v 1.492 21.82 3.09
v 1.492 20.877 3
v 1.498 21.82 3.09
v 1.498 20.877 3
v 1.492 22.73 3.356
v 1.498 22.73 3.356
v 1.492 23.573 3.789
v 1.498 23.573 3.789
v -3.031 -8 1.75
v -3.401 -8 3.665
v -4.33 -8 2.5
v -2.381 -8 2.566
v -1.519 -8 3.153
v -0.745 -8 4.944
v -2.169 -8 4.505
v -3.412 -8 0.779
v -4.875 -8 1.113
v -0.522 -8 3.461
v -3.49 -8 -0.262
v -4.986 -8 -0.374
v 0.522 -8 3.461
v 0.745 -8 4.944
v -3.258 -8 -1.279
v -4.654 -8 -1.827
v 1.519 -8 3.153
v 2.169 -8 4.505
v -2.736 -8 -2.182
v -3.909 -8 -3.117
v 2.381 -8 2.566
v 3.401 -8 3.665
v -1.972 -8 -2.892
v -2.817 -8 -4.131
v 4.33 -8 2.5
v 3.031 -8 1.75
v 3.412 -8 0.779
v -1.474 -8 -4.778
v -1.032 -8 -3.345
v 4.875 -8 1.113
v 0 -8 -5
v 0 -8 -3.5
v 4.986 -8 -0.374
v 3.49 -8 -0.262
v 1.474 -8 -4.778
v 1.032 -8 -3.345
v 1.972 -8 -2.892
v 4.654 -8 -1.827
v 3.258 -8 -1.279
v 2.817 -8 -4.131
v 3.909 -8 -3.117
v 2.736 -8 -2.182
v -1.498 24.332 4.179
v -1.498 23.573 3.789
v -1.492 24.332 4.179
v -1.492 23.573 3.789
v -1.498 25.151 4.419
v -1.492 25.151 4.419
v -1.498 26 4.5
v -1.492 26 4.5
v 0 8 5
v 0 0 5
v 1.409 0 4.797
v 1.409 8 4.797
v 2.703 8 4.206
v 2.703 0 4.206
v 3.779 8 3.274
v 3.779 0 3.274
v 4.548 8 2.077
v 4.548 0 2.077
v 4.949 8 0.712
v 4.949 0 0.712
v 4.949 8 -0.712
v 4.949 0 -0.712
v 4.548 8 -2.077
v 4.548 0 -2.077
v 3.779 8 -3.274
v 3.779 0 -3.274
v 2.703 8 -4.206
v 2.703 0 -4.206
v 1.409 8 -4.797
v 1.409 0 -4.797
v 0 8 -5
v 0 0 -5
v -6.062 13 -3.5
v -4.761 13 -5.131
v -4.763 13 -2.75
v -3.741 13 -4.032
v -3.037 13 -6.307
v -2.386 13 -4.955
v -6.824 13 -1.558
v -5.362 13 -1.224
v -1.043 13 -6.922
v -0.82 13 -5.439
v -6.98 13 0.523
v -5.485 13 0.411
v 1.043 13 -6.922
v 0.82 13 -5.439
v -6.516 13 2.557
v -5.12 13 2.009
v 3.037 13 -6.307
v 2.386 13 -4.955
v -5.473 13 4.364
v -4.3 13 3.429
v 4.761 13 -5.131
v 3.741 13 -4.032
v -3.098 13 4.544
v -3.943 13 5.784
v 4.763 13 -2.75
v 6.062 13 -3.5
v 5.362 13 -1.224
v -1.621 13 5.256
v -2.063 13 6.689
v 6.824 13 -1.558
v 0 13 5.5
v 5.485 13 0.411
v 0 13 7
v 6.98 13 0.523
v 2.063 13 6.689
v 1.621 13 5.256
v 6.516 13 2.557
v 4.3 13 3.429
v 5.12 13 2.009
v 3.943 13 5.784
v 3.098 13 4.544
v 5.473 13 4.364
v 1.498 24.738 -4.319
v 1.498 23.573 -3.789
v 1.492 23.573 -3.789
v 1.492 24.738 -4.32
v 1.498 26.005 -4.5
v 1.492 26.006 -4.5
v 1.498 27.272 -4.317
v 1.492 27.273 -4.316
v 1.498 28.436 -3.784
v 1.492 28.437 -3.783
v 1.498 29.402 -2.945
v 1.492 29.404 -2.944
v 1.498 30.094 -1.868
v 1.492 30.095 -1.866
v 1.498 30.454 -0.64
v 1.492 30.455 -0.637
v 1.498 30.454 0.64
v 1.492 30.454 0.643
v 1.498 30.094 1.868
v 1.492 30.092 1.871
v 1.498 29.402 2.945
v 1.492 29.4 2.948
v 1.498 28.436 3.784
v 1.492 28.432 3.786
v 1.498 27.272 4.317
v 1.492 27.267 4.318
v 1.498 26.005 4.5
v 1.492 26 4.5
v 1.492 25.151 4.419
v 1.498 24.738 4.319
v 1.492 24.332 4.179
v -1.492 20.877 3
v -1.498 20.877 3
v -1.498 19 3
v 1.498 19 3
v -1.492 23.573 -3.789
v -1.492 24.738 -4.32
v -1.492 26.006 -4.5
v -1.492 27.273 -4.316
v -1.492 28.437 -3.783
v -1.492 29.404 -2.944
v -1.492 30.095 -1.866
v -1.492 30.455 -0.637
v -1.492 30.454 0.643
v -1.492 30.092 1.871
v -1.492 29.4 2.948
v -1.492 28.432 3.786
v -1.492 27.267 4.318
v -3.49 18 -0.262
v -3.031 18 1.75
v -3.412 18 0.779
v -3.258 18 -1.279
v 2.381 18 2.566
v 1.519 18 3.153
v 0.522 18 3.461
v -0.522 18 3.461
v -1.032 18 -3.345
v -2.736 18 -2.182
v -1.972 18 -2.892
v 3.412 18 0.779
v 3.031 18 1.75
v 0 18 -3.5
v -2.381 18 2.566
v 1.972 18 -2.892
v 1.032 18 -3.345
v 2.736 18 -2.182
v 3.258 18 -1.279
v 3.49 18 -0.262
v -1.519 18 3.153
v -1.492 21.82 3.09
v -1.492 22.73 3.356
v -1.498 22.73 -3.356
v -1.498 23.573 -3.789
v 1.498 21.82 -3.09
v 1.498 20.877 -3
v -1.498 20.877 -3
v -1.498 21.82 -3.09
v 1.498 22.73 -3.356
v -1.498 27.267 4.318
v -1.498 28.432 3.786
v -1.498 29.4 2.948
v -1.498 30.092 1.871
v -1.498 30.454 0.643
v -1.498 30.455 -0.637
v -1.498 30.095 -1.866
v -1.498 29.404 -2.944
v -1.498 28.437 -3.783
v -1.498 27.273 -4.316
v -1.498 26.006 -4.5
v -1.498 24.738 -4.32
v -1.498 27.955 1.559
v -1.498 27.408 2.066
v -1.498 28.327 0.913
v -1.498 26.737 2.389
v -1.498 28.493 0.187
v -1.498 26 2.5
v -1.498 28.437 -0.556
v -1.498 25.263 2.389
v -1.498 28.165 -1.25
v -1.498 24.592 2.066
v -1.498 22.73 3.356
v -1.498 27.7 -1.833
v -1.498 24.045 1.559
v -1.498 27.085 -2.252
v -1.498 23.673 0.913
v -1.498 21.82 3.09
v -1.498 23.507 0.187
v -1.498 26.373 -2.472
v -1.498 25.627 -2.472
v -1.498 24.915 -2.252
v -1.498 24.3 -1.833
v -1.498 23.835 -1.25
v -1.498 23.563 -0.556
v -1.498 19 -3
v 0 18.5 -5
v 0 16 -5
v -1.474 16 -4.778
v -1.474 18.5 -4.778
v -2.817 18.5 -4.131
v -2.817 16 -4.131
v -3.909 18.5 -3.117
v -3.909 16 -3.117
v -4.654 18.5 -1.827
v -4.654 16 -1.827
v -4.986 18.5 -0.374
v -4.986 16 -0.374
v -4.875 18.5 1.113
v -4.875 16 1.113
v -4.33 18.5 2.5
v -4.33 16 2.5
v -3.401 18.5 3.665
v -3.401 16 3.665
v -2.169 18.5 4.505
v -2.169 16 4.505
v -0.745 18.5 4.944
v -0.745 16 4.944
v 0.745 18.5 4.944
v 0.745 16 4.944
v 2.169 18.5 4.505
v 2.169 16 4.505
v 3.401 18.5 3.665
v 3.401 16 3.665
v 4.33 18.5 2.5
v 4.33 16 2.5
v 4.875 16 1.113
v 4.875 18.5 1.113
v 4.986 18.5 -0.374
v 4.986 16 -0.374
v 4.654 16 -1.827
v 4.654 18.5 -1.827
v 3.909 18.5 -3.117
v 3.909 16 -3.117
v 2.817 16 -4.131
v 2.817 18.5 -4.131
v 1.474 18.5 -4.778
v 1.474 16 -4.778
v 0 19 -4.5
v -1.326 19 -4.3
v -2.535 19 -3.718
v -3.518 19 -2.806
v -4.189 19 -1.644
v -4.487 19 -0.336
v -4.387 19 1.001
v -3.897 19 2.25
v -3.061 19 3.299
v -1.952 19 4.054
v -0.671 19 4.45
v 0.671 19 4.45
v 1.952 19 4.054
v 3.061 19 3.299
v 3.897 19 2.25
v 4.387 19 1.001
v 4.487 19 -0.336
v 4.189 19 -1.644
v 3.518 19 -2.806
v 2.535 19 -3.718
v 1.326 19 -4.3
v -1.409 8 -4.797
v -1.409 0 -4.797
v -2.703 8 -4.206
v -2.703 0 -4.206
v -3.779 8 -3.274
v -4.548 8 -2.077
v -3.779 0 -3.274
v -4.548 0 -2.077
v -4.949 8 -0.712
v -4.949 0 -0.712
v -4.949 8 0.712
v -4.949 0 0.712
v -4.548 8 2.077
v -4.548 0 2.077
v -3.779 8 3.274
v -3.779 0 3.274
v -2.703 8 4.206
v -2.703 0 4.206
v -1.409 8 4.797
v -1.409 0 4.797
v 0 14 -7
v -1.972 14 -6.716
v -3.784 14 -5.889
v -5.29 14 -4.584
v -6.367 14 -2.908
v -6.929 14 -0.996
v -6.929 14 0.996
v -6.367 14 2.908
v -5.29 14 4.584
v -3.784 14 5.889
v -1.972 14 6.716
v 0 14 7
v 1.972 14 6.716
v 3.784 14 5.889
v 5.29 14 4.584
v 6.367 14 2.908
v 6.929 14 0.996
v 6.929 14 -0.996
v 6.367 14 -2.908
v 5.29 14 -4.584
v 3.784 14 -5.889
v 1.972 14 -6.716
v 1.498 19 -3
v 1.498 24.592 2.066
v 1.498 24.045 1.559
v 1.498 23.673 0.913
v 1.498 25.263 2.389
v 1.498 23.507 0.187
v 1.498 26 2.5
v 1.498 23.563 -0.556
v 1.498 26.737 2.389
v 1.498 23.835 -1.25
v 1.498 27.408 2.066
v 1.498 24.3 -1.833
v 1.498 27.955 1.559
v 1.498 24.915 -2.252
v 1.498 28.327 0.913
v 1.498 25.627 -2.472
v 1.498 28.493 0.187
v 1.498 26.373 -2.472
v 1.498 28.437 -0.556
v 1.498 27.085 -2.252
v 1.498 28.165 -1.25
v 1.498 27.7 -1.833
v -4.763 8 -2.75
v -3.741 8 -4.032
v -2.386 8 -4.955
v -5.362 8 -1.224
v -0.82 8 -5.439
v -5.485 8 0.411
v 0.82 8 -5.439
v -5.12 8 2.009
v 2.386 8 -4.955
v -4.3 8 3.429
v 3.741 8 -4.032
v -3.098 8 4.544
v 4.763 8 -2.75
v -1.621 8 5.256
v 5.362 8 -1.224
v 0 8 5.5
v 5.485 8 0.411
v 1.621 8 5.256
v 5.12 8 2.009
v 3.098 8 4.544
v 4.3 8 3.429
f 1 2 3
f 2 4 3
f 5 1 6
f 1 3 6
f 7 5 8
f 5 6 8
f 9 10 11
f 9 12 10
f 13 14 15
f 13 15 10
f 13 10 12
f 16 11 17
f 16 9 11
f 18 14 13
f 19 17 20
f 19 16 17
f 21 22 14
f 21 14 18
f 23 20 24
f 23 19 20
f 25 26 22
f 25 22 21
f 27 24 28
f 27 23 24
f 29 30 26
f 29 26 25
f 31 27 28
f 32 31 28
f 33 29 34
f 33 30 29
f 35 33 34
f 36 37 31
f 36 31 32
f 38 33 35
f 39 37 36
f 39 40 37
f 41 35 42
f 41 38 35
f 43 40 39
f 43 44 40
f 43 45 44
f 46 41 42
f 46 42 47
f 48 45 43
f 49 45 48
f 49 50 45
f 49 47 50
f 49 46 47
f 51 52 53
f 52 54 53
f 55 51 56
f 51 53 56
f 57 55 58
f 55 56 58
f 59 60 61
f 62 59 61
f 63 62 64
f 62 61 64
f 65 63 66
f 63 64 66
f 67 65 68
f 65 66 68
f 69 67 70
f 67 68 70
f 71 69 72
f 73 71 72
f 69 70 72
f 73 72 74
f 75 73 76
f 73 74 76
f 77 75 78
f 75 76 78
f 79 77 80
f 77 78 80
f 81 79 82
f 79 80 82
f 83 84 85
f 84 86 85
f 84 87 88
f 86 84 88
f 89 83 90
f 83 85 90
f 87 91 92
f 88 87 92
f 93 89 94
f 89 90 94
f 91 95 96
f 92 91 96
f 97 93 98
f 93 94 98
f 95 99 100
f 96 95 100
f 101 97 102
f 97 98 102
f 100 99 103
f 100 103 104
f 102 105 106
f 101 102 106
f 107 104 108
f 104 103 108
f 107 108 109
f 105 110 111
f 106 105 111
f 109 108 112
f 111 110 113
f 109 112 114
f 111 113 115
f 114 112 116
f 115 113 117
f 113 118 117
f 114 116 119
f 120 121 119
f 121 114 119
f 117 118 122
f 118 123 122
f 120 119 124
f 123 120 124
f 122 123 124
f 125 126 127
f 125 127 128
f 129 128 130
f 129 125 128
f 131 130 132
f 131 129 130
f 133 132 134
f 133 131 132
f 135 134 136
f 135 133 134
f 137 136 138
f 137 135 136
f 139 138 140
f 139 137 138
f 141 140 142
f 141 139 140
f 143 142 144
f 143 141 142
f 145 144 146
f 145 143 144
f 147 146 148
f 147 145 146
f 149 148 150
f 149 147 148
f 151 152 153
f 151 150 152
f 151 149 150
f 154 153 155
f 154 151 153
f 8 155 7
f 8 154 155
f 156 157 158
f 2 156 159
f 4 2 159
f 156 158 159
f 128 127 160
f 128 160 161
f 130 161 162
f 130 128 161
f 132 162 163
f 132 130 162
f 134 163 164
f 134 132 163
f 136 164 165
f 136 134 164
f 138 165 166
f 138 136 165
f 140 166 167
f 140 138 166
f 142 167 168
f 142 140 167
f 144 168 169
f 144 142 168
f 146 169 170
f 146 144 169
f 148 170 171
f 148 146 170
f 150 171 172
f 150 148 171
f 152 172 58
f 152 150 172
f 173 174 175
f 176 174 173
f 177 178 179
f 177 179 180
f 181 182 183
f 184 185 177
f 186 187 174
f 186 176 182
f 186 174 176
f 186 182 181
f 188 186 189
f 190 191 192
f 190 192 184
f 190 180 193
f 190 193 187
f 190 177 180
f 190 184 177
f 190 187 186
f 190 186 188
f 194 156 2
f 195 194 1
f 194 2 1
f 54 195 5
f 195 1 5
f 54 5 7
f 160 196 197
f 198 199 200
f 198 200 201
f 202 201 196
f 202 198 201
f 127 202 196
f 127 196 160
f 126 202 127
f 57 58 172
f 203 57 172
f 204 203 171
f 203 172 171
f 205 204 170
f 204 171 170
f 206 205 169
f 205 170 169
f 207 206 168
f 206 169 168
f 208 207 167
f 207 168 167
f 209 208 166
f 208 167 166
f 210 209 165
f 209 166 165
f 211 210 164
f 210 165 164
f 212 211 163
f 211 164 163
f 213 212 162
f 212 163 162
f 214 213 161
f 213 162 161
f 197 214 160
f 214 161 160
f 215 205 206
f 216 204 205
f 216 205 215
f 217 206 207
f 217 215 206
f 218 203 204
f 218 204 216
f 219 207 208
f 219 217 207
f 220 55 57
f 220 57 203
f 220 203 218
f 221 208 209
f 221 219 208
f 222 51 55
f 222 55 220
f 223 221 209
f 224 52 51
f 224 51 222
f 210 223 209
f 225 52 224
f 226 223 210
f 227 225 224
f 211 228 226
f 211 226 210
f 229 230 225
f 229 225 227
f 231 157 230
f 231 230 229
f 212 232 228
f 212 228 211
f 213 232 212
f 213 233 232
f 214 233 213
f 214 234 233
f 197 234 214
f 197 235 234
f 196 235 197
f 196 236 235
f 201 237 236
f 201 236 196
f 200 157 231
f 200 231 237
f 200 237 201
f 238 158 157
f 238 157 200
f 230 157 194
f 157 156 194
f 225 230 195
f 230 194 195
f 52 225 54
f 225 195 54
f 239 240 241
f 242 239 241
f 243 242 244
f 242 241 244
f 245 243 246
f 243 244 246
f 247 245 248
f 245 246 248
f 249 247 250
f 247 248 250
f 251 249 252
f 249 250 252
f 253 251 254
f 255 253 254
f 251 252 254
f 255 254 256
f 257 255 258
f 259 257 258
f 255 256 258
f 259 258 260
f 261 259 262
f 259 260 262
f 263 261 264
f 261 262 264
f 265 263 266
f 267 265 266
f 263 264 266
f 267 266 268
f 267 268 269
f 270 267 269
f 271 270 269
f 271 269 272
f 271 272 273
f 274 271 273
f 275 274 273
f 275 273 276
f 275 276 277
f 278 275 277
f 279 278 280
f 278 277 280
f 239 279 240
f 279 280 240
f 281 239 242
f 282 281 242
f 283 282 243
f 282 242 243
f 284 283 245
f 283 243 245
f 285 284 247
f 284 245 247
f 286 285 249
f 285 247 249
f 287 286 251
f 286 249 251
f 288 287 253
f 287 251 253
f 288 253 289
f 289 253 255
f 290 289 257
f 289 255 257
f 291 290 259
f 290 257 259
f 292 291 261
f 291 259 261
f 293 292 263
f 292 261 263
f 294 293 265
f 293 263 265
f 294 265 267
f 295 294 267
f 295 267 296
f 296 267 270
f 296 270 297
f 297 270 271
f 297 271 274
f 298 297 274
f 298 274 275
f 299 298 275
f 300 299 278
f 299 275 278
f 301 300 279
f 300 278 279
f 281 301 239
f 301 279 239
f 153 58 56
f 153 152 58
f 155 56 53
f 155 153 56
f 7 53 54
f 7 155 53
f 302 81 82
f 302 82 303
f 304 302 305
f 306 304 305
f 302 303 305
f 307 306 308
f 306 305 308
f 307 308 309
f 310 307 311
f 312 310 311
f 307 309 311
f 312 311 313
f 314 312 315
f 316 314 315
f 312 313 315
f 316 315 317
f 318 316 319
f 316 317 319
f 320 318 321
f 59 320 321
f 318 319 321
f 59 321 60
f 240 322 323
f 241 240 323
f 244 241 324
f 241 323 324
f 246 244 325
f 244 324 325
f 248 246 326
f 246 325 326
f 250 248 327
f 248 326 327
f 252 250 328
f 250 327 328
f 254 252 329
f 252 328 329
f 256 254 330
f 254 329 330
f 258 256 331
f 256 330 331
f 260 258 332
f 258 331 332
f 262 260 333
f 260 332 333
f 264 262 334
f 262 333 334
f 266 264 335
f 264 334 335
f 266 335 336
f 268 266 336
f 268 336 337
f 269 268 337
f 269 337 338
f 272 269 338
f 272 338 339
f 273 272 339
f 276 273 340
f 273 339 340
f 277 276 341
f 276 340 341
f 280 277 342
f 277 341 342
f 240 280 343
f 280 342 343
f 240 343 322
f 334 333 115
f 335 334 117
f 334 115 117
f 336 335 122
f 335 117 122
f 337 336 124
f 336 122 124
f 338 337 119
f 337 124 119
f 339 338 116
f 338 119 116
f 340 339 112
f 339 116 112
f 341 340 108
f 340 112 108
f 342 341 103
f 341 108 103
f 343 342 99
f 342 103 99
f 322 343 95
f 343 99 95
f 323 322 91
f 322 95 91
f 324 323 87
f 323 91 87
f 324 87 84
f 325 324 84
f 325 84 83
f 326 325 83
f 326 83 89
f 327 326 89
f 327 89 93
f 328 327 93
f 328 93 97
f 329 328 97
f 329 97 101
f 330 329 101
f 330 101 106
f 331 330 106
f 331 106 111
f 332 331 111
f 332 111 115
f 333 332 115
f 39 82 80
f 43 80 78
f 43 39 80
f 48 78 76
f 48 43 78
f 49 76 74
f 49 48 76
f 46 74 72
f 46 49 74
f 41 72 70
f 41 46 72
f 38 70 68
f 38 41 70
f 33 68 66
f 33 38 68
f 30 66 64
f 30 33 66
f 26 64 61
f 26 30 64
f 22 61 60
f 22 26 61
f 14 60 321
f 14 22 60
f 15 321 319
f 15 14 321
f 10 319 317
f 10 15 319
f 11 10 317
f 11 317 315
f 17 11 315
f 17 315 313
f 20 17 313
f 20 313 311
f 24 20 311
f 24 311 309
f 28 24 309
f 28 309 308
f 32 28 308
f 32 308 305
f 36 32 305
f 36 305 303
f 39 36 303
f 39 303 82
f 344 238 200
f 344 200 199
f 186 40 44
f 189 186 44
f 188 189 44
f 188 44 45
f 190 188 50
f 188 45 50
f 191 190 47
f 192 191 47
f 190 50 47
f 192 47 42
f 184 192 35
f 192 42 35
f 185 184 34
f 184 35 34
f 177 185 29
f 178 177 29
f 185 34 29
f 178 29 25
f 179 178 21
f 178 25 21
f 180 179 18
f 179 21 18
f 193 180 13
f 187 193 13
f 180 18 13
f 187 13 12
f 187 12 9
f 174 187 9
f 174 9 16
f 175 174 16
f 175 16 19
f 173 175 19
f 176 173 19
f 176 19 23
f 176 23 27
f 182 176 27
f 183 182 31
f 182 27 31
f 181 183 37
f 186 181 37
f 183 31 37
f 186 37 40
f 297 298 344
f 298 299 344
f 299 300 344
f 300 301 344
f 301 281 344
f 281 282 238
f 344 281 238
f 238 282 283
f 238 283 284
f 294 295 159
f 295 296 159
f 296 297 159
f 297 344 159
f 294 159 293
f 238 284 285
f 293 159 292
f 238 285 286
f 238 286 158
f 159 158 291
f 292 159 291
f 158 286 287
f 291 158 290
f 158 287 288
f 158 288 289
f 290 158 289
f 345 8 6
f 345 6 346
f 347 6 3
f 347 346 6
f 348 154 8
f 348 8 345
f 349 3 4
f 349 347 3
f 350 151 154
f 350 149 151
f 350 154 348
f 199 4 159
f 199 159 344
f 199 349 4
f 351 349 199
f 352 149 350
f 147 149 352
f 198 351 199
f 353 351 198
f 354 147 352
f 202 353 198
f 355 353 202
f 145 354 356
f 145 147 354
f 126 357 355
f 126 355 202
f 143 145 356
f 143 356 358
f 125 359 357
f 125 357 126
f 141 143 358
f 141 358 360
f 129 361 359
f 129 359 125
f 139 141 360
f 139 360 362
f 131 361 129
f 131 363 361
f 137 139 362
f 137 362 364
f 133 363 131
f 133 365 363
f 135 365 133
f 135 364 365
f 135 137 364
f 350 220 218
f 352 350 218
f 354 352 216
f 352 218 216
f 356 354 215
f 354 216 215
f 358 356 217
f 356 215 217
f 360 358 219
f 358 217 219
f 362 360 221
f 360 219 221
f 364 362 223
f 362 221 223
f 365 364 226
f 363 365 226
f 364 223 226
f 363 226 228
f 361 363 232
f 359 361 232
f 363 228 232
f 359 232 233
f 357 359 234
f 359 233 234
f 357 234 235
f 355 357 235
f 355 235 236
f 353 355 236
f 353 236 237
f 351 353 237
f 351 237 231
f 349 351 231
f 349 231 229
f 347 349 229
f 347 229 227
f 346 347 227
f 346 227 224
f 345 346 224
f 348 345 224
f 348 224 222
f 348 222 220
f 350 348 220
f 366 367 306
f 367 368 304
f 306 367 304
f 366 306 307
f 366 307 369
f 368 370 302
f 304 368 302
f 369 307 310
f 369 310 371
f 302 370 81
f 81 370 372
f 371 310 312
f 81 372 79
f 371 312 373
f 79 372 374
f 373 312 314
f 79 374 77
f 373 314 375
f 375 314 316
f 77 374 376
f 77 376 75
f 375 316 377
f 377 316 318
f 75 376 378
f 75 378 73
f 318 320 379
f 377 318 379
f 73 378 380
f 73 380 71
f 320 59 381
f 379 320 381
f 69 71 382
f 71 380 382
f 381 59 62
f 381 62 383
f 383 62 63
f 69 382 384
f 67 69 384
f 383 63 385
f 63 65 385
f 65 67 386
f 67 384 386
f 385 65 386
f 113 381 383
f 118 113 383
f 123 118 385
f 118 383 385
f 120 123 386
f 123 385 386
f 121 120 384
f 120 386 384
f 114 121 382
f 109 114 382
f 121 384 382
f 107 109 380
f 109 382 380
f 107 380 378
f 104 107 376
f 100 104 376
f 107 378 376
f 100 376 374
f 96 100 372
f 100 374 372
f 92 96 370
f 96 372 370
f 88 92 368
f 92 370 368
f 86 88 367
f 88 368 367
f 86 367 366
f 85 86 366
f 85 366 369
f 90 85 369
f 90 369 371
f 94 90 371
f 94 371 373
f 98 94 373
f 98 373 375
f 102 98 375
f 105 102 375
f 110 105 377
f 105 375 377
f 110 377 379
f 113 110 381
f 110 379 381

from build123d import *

# Parameters (mm, degrees)
SKETCH1_R            = 5
BOSS_EXTRUDE1_DEPTH  = 8
SKETCH2_R            = 5.5
BOSS_EXTRUDE2_DEPTH  = 5
SKETCH3_R            = 7
BOSS_EXTRUDE3_DEPTH  = 1
CHAMFER2_SIZE        = 0.5
SKETCH48_W           = 2.996334688
SKETCH48_H           = 6
BOSS_EXTRUDE7_DEPTH  = 7
SKETCH50_R           = 4.5
BOSS_EXTRUDE9_DEPTH  = 2.99
BOSS_EXTRUDE10_START = -2.99
SKETCH51_R           = 4.5
BOSS_EXTRUDE10_DEPTH = 2.99
SKETCH52_R           = 2.5
CUT_EXTRUDE1_DEPTH   = 4
BOSS_EXTRUDE11_START = 16
SKETCH56_R           = 5
BOSS_EXTRUDE11_DEPTH = 16
SKETCH57_R           = 3.25
CUT_EXTRUDE7_DEPTH   = 21
SKETCH59_R           = 3.5
CUT_EXTRUDE10_DEPTH  = 26
FILLET1_R            = 5


with BuildPart() as part:
    # Sketch1 → Boss-Extrude1 (new body)
    with BuildSketch(Plane(origin=(0, 0, 0), x_dir=(1, 0, 0), z_dir=(0, 1, 0))):
        with Locations(Location((0, 0, 0), (0, 0, 270))):
            Circle(SKETCH1_R)
    extrude(amount=BOSS_EXTRUDE1_DEPTH)

    # Sketch2 → Boss-Extrude2 (add)
    with BuildSketch(Plane(origin=(0, 8, 0), x_dir=(1, 0, 0), z_dir=(0, 1, 0))):
        with Locations(Location((0, 0, 0), (0, 0, 270))):
            Circle(SKETCH2_R)
    extrude(amount=BOSS_EXTRUDE2_DEPTH)

    # Sketch3 → Boss-Extrude3 (add)
    with BuildSketch(Plane(origin=(0, 13, 0), x_dir=(1, 0, 0), z_dir=(0, 1, 0))):
        with Locations(Location((0, 0, 0), (0, 0, 270))):
            Circle(SKETCH3_R)
    extrude(amount=BOSS_EXTRUDE3_DEPTH)

    # Sketch47 → Revolve1 (revolve)
    with BuildSketch(Plane(origin=(0, 0, 0), x_dir=(0, 0, -1), z_dir=(1, 0, 0))):
        Polygon((0, 14), (0, 19), (5, 19), (5, 16), (7, 14), align=None)
    revolve(axis=Axis((0, 14, 0), (0, 1, 0)))

    # Chamfer2
    chamfer2_edges = [part.edges().sort_by_distance(p)[0] for p in [
        (0, 19, 5),
    ]]
    chamfer(chamfer2_edges, length=CHAMFER2_SIZE)

    # Sketch48 → Boss-Extrude7 (add)
    with BuildSketch(Plane(origin=(0, 19, 0), x_dir=(1, 0, 0), z_dir=(0, 1, 0))):
        Rectangle(SKETCH48_W, SKETCH48_H)
    extrude(amount=BOSS_EXTRUDE7_DEPTH)

    # Sketch50 → Boss-Extrude9 (add)
    with BuildSketch(Plane(origin=(1.498167344, 0, 0), x_dir=(0, 0, -1), z_dir=(1, 0, 0))):
        with Locations((0, 26)):
            Circle(SKETCH50_R)
    extrude(amount=-BOSS_EXTRUDE9_DEPTH)

    # Sketch51 → Boss-Extrude10 (add)
    with BuildSketch(Plane.ZY.offset(1.498167344).offset(BOSS_EXTRUDE10_START)):
        with Locations((0, 26)):
            Circle(SKETCH51_R)
    extrude(amount=BOSS_EXTRUDE10_DEPTH)

    # Sketch52 → Cut-Extrude1 (cut)
    with BuildSketch(Plane.ZY.offset(1.498167344)):
        with Locations((0, 26)):
            Circle(SKETCH52_R)
    extrude(amount=-CUT_EXTRUDE1_DEPTH, mode=Mode.SUBTRACT)

    # Sketch56 → Boss-Extrude11 (add)
    with BuildSketch(Plane.XZ.offset(-8).offset(BOSS_EXTRUDE11_START)):
        with Locations(Location((0, 0, 0), (0, 0, 270))):
            Circle(SKETCH56_R)
    extrude(amount=-BOSS_EXTRUDE11_DEPTH)

    # Sketch57 → Cut-Extrude7 (cut)
    with BuildSketch(Plane.XZ.offset(8)):
        with Locations(Location((0, 0, 0), (0, 0, 270))):
            Circle(SKETCH57_R)
    extrude(amount=-CUT_EXTRUDE7_DEPTH, mode=Mode.SUBTRACT)

    # Sketch59 → Cut-Extrude10 (cut)
    with BuildSketch(Plane(origin=(0, -8, 0), x_dir=(-1, 0, 0), z_dir=(0, -1, 0))):
        with Locations(Location((0, 0, 0), (0, 0, 90))):
            Circle(SKETCH59_R)
    extrude(amount=-CUT_EXTRUDE10_DEPTH, mode=Mode.SUBTRACT)

    # Fillet1
    fillet1_edges = [part.edges().sort_by_distance(p)[0] for p in [
        (0, 22.645898034, 3),
        (0, 22.645898034, -3),
    ]]
    fillet(fillet1_edges, radius=FILLET1_R)


solid = part.part
